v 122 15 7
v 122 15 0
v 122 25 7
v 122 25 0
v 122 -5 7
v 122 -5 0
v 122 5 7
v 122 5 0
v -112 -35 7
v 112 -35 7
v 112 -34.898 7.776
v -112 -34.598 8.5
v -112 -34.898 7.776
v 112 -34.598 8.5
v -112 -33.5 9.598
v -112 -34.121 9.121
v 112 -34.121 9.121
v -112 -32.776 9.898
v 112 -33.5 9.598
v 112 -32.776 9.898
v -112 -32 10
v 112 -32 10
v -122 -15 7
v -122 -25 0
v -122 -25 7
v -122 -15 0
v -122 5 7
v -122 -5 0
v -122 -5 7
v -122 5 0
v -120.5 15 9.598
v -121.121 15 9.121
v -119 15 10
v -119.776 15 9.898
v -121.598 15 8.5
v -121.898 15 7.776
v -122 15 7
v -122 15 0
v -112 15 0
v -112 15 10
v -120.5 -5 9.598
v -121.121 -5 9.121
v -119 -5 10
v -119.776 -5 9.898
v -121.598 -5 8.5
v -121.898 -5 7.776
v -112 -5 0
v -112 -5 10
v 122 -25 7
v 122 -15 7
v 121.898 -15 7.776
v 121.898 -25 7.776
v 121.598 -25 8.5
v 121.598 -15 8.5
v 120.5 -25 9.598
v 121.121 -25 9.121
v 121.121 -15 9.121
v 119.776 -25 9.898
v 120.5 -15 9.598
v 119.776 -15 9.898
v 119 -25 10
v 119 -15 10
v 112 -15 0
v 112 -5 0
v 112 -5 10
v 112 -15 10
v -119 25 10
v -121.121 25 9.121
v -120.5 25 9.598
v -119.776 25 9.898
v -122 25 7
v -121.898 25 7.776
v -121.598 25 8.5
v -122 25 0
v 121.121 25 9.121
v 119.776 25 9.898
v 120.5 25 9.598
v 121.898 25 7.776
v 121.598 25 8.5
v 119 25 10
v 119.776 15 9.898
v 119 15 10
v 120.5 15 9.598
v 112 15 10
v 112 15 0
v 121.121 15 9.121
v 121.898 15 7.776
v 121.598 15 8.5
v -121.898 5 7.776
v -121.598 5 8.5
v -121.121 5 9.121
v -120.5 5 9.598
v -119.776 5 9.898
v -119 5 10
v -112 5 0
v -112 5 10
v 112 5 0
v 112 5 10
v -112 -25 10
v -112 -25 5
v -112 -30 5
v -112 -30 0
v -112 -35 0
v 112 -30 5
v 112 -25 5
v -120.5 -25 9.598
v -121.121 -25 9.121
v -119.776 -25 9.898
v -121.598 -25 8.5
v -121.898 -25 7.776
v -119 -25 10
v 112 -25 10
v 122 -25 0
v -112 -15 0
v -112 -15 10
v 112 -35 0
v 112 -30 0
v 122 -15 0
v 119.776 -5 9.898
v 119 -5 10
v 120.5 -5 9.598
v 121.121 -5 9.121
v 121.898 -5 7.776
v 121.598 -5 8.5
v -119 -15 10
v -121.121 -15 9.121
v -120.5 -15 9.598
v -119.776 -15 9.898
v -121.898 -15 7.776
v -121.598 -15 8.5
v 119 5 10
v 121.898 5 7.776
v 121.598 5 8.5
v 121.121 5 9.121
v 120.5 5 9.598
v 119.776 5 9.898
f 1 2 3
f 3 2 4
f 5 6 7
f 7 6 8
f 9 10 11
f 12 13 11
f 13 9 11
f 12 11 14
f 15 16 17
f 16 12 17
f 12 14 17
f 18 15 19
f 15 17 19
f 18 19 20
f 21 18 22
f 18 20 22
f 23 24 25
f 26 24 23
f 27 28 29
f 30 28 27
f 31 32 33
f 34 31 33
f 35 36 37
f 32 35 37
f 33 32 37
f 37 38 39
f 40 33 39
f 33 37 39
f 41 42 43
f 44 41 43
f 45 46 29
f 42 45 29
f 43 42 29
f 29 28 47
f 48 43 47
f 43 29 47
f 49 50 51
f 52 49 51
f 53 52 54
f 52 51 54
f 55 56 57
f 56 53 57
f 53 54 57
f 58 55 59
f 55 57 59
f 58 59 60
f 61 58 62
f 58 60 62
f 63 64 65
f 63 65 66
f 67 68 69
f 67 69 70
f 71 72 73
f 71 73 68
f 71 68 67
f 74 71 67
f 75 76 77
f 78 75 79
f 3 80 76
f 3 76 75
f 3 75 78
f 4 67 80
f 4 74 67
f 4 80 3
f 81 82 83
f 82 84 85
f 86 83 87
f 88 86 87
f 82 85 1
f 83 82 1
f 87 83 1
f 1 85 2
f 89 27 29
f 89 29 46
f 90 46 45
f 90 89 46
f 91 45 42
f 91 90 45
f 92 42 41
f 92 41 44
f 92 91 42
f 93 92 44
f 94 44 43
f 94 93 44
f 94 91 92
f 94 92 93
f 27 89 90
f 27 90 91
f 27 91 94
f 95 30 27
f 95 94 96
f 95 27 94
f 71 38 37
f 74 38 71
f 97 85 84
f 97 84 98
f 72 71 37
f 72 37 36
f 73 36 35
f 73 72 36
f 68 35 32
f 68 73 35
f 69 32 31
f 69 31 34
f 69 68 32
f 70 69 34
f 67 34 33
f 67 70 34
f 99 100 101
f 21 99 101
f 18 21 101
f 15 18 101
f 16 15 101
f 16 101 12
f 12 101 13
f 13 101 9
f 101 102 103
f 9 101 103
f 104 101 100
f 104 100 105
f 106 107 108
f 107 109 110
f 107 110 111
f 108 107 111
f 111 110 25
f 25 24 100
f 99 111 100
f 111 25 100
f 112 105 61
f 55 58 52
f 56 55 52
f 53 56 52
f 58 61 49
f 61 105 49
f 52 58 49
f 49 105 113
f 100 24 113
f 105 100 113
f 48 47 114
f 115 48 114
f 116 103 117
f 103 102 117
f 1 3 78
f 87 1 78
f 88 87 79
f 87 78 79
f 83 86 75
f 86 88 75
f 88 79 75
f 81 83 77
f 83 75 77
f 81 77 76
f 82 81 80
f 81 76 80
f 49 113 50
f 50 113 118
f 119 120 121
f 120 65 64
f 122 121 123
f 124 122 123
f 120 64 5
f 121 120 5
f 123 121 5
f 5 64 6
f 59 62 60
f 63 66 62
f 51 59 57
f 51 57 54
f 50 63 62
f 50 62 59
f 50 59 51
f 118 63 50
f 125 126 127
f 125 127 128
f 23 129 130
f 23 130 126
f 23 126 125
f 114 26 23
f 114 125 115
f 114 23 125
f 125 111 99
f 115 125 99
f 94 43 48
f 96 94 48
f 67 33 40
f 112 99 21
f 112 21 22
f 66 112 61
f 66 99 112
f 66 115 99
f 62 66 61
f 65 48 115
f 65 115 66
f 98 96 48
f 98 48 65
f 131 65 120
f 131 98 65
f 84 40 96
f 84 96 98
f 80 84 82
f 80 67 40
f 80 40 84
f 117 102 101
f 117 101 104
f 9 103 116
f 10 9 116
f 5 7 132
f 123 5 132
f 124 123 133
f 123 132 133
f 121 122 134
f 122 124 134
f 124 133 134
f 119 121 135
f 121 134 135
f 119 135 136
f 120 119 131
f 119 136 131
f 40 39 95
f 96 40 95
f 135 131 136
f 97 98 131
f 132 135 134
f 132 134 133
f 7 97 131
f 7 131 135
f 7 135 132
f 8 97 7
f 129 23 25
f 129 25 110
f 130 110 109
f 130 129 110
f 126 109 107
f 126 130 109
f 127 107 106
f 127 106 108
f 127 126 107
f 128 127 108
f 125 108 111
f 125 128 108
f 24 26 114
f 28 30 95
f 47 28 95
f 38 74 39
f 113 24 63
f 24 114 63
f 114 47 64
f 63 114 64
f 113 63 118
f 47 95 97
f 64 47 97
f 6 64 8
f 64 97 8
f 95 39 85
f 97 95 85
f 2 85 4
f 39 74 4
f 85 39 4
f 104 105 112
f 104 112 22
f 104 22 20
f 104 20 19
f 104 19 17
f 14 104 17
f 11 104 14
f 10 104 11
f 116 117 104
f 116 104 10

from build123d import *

# Parameters (mm, degrees)
SKETCH_W        = 244
SKETCH_H        = 70
PAD_DEPTH       = 10
FILLET_R        = 3
FILLET001_R     = 3
FILLET002_R     = 3
FILLET003_R     = 3
POCKET_DEPTH    = 5
SKETCH002_W     = 10
SKETCH002_H     = 10
SKETCH002_W_2   = 244
POCKET001_DEPTH = 10.001


with BuildPart() as part:
    # Sketch → Pad (new body)
    with BuildSketch(Plane.XY):
        Rectangle(SKETCH_W, SKETCH_H)
    extrude(amount=PAD_DEPTH)

    # Fillet
    fillet_edges = [part.edges().sort_by_distance(p)[0] for p in [
        (0, -35, 10),
    ]]
    fillet(fillet_edges, radius=FILLET_R)

    # Fillet001
    fillet001_edges = [part.edges().sort_by_distance(p)[0] for p in [
        (-122, 1.5, 10),
    ]]
    fillet(fillet001_edges, radius=FILLET001_R)

    # Fillet002
    fillet002_edges = [part.edges().sort_by_distance(p)[0] for p in [
        (1.5, 35, 10),
    ]]
    fillet(fillet002_edges, radius=FILLET002_R)

    # Fillet003
    fillet003_edges = [part.edges().sort_by_distance(p)[0] for p in [
        (122, 0, 10),
    ]]
    fillet(fillet003_edges, radius=FILLET003_R)

    # Sketch001 (on Face2 of Fillet003) → Pocket (cut)
    with BuildSketch(Plane(origin=(0, 0, 0), x_dir=(1, 0, 0), z_dir=(0, 0, -1))):
        with BuildLine():
            ThreePointArc((-117, 30), (-119.5, 27.5), (-117, 25))
            Line((-117, 25), (117, 25))
            ThreePointArc((117, 25), (119.5, 27.5), (117, 30))
            Line((-117, 30), (117, 30))
        make_face()
    extrude(amount=-POCKET_DEPTH, mode=Mode.SUBTRACT)

    # Sketch002 (on Face2 of Pocket) → Pocket001 (cut, through all)
    with BuildSketch(Plane(origin=(0, 0, 0), x_dir=(1, 0, 0), z_dir=(0, 0, -1))):
        with Locations((-117, 10)):
            Rectangle(SKETCH002_W, SKETCH002_H)
        with Locations((-117, 30)):
            Rectangle(SKETCH002_W, SKETCH002_H)
        with Locations((-117, -10)):
            Rectangle(SKETCH002_W, SKETCH002_H)
        with Locations((117, 10)):
            Rectangle(SKETCH002_W, SKETCH002_H)
        with Locations((117, 30)):
            Rectangle(SKETCH002_W, SKETCH002_H)
        with Locations((117, -10)):
            Rectangle(SKETCH002_W, SKETCH002_H)
        with Locations((0, -30)):
            Rectangle(SKETCH002_W_2, SKETCH002_H)
    extrude(amount=-POCKET001_DEPTH, mode=Mode.SUBTRACT)


solid = part.part
